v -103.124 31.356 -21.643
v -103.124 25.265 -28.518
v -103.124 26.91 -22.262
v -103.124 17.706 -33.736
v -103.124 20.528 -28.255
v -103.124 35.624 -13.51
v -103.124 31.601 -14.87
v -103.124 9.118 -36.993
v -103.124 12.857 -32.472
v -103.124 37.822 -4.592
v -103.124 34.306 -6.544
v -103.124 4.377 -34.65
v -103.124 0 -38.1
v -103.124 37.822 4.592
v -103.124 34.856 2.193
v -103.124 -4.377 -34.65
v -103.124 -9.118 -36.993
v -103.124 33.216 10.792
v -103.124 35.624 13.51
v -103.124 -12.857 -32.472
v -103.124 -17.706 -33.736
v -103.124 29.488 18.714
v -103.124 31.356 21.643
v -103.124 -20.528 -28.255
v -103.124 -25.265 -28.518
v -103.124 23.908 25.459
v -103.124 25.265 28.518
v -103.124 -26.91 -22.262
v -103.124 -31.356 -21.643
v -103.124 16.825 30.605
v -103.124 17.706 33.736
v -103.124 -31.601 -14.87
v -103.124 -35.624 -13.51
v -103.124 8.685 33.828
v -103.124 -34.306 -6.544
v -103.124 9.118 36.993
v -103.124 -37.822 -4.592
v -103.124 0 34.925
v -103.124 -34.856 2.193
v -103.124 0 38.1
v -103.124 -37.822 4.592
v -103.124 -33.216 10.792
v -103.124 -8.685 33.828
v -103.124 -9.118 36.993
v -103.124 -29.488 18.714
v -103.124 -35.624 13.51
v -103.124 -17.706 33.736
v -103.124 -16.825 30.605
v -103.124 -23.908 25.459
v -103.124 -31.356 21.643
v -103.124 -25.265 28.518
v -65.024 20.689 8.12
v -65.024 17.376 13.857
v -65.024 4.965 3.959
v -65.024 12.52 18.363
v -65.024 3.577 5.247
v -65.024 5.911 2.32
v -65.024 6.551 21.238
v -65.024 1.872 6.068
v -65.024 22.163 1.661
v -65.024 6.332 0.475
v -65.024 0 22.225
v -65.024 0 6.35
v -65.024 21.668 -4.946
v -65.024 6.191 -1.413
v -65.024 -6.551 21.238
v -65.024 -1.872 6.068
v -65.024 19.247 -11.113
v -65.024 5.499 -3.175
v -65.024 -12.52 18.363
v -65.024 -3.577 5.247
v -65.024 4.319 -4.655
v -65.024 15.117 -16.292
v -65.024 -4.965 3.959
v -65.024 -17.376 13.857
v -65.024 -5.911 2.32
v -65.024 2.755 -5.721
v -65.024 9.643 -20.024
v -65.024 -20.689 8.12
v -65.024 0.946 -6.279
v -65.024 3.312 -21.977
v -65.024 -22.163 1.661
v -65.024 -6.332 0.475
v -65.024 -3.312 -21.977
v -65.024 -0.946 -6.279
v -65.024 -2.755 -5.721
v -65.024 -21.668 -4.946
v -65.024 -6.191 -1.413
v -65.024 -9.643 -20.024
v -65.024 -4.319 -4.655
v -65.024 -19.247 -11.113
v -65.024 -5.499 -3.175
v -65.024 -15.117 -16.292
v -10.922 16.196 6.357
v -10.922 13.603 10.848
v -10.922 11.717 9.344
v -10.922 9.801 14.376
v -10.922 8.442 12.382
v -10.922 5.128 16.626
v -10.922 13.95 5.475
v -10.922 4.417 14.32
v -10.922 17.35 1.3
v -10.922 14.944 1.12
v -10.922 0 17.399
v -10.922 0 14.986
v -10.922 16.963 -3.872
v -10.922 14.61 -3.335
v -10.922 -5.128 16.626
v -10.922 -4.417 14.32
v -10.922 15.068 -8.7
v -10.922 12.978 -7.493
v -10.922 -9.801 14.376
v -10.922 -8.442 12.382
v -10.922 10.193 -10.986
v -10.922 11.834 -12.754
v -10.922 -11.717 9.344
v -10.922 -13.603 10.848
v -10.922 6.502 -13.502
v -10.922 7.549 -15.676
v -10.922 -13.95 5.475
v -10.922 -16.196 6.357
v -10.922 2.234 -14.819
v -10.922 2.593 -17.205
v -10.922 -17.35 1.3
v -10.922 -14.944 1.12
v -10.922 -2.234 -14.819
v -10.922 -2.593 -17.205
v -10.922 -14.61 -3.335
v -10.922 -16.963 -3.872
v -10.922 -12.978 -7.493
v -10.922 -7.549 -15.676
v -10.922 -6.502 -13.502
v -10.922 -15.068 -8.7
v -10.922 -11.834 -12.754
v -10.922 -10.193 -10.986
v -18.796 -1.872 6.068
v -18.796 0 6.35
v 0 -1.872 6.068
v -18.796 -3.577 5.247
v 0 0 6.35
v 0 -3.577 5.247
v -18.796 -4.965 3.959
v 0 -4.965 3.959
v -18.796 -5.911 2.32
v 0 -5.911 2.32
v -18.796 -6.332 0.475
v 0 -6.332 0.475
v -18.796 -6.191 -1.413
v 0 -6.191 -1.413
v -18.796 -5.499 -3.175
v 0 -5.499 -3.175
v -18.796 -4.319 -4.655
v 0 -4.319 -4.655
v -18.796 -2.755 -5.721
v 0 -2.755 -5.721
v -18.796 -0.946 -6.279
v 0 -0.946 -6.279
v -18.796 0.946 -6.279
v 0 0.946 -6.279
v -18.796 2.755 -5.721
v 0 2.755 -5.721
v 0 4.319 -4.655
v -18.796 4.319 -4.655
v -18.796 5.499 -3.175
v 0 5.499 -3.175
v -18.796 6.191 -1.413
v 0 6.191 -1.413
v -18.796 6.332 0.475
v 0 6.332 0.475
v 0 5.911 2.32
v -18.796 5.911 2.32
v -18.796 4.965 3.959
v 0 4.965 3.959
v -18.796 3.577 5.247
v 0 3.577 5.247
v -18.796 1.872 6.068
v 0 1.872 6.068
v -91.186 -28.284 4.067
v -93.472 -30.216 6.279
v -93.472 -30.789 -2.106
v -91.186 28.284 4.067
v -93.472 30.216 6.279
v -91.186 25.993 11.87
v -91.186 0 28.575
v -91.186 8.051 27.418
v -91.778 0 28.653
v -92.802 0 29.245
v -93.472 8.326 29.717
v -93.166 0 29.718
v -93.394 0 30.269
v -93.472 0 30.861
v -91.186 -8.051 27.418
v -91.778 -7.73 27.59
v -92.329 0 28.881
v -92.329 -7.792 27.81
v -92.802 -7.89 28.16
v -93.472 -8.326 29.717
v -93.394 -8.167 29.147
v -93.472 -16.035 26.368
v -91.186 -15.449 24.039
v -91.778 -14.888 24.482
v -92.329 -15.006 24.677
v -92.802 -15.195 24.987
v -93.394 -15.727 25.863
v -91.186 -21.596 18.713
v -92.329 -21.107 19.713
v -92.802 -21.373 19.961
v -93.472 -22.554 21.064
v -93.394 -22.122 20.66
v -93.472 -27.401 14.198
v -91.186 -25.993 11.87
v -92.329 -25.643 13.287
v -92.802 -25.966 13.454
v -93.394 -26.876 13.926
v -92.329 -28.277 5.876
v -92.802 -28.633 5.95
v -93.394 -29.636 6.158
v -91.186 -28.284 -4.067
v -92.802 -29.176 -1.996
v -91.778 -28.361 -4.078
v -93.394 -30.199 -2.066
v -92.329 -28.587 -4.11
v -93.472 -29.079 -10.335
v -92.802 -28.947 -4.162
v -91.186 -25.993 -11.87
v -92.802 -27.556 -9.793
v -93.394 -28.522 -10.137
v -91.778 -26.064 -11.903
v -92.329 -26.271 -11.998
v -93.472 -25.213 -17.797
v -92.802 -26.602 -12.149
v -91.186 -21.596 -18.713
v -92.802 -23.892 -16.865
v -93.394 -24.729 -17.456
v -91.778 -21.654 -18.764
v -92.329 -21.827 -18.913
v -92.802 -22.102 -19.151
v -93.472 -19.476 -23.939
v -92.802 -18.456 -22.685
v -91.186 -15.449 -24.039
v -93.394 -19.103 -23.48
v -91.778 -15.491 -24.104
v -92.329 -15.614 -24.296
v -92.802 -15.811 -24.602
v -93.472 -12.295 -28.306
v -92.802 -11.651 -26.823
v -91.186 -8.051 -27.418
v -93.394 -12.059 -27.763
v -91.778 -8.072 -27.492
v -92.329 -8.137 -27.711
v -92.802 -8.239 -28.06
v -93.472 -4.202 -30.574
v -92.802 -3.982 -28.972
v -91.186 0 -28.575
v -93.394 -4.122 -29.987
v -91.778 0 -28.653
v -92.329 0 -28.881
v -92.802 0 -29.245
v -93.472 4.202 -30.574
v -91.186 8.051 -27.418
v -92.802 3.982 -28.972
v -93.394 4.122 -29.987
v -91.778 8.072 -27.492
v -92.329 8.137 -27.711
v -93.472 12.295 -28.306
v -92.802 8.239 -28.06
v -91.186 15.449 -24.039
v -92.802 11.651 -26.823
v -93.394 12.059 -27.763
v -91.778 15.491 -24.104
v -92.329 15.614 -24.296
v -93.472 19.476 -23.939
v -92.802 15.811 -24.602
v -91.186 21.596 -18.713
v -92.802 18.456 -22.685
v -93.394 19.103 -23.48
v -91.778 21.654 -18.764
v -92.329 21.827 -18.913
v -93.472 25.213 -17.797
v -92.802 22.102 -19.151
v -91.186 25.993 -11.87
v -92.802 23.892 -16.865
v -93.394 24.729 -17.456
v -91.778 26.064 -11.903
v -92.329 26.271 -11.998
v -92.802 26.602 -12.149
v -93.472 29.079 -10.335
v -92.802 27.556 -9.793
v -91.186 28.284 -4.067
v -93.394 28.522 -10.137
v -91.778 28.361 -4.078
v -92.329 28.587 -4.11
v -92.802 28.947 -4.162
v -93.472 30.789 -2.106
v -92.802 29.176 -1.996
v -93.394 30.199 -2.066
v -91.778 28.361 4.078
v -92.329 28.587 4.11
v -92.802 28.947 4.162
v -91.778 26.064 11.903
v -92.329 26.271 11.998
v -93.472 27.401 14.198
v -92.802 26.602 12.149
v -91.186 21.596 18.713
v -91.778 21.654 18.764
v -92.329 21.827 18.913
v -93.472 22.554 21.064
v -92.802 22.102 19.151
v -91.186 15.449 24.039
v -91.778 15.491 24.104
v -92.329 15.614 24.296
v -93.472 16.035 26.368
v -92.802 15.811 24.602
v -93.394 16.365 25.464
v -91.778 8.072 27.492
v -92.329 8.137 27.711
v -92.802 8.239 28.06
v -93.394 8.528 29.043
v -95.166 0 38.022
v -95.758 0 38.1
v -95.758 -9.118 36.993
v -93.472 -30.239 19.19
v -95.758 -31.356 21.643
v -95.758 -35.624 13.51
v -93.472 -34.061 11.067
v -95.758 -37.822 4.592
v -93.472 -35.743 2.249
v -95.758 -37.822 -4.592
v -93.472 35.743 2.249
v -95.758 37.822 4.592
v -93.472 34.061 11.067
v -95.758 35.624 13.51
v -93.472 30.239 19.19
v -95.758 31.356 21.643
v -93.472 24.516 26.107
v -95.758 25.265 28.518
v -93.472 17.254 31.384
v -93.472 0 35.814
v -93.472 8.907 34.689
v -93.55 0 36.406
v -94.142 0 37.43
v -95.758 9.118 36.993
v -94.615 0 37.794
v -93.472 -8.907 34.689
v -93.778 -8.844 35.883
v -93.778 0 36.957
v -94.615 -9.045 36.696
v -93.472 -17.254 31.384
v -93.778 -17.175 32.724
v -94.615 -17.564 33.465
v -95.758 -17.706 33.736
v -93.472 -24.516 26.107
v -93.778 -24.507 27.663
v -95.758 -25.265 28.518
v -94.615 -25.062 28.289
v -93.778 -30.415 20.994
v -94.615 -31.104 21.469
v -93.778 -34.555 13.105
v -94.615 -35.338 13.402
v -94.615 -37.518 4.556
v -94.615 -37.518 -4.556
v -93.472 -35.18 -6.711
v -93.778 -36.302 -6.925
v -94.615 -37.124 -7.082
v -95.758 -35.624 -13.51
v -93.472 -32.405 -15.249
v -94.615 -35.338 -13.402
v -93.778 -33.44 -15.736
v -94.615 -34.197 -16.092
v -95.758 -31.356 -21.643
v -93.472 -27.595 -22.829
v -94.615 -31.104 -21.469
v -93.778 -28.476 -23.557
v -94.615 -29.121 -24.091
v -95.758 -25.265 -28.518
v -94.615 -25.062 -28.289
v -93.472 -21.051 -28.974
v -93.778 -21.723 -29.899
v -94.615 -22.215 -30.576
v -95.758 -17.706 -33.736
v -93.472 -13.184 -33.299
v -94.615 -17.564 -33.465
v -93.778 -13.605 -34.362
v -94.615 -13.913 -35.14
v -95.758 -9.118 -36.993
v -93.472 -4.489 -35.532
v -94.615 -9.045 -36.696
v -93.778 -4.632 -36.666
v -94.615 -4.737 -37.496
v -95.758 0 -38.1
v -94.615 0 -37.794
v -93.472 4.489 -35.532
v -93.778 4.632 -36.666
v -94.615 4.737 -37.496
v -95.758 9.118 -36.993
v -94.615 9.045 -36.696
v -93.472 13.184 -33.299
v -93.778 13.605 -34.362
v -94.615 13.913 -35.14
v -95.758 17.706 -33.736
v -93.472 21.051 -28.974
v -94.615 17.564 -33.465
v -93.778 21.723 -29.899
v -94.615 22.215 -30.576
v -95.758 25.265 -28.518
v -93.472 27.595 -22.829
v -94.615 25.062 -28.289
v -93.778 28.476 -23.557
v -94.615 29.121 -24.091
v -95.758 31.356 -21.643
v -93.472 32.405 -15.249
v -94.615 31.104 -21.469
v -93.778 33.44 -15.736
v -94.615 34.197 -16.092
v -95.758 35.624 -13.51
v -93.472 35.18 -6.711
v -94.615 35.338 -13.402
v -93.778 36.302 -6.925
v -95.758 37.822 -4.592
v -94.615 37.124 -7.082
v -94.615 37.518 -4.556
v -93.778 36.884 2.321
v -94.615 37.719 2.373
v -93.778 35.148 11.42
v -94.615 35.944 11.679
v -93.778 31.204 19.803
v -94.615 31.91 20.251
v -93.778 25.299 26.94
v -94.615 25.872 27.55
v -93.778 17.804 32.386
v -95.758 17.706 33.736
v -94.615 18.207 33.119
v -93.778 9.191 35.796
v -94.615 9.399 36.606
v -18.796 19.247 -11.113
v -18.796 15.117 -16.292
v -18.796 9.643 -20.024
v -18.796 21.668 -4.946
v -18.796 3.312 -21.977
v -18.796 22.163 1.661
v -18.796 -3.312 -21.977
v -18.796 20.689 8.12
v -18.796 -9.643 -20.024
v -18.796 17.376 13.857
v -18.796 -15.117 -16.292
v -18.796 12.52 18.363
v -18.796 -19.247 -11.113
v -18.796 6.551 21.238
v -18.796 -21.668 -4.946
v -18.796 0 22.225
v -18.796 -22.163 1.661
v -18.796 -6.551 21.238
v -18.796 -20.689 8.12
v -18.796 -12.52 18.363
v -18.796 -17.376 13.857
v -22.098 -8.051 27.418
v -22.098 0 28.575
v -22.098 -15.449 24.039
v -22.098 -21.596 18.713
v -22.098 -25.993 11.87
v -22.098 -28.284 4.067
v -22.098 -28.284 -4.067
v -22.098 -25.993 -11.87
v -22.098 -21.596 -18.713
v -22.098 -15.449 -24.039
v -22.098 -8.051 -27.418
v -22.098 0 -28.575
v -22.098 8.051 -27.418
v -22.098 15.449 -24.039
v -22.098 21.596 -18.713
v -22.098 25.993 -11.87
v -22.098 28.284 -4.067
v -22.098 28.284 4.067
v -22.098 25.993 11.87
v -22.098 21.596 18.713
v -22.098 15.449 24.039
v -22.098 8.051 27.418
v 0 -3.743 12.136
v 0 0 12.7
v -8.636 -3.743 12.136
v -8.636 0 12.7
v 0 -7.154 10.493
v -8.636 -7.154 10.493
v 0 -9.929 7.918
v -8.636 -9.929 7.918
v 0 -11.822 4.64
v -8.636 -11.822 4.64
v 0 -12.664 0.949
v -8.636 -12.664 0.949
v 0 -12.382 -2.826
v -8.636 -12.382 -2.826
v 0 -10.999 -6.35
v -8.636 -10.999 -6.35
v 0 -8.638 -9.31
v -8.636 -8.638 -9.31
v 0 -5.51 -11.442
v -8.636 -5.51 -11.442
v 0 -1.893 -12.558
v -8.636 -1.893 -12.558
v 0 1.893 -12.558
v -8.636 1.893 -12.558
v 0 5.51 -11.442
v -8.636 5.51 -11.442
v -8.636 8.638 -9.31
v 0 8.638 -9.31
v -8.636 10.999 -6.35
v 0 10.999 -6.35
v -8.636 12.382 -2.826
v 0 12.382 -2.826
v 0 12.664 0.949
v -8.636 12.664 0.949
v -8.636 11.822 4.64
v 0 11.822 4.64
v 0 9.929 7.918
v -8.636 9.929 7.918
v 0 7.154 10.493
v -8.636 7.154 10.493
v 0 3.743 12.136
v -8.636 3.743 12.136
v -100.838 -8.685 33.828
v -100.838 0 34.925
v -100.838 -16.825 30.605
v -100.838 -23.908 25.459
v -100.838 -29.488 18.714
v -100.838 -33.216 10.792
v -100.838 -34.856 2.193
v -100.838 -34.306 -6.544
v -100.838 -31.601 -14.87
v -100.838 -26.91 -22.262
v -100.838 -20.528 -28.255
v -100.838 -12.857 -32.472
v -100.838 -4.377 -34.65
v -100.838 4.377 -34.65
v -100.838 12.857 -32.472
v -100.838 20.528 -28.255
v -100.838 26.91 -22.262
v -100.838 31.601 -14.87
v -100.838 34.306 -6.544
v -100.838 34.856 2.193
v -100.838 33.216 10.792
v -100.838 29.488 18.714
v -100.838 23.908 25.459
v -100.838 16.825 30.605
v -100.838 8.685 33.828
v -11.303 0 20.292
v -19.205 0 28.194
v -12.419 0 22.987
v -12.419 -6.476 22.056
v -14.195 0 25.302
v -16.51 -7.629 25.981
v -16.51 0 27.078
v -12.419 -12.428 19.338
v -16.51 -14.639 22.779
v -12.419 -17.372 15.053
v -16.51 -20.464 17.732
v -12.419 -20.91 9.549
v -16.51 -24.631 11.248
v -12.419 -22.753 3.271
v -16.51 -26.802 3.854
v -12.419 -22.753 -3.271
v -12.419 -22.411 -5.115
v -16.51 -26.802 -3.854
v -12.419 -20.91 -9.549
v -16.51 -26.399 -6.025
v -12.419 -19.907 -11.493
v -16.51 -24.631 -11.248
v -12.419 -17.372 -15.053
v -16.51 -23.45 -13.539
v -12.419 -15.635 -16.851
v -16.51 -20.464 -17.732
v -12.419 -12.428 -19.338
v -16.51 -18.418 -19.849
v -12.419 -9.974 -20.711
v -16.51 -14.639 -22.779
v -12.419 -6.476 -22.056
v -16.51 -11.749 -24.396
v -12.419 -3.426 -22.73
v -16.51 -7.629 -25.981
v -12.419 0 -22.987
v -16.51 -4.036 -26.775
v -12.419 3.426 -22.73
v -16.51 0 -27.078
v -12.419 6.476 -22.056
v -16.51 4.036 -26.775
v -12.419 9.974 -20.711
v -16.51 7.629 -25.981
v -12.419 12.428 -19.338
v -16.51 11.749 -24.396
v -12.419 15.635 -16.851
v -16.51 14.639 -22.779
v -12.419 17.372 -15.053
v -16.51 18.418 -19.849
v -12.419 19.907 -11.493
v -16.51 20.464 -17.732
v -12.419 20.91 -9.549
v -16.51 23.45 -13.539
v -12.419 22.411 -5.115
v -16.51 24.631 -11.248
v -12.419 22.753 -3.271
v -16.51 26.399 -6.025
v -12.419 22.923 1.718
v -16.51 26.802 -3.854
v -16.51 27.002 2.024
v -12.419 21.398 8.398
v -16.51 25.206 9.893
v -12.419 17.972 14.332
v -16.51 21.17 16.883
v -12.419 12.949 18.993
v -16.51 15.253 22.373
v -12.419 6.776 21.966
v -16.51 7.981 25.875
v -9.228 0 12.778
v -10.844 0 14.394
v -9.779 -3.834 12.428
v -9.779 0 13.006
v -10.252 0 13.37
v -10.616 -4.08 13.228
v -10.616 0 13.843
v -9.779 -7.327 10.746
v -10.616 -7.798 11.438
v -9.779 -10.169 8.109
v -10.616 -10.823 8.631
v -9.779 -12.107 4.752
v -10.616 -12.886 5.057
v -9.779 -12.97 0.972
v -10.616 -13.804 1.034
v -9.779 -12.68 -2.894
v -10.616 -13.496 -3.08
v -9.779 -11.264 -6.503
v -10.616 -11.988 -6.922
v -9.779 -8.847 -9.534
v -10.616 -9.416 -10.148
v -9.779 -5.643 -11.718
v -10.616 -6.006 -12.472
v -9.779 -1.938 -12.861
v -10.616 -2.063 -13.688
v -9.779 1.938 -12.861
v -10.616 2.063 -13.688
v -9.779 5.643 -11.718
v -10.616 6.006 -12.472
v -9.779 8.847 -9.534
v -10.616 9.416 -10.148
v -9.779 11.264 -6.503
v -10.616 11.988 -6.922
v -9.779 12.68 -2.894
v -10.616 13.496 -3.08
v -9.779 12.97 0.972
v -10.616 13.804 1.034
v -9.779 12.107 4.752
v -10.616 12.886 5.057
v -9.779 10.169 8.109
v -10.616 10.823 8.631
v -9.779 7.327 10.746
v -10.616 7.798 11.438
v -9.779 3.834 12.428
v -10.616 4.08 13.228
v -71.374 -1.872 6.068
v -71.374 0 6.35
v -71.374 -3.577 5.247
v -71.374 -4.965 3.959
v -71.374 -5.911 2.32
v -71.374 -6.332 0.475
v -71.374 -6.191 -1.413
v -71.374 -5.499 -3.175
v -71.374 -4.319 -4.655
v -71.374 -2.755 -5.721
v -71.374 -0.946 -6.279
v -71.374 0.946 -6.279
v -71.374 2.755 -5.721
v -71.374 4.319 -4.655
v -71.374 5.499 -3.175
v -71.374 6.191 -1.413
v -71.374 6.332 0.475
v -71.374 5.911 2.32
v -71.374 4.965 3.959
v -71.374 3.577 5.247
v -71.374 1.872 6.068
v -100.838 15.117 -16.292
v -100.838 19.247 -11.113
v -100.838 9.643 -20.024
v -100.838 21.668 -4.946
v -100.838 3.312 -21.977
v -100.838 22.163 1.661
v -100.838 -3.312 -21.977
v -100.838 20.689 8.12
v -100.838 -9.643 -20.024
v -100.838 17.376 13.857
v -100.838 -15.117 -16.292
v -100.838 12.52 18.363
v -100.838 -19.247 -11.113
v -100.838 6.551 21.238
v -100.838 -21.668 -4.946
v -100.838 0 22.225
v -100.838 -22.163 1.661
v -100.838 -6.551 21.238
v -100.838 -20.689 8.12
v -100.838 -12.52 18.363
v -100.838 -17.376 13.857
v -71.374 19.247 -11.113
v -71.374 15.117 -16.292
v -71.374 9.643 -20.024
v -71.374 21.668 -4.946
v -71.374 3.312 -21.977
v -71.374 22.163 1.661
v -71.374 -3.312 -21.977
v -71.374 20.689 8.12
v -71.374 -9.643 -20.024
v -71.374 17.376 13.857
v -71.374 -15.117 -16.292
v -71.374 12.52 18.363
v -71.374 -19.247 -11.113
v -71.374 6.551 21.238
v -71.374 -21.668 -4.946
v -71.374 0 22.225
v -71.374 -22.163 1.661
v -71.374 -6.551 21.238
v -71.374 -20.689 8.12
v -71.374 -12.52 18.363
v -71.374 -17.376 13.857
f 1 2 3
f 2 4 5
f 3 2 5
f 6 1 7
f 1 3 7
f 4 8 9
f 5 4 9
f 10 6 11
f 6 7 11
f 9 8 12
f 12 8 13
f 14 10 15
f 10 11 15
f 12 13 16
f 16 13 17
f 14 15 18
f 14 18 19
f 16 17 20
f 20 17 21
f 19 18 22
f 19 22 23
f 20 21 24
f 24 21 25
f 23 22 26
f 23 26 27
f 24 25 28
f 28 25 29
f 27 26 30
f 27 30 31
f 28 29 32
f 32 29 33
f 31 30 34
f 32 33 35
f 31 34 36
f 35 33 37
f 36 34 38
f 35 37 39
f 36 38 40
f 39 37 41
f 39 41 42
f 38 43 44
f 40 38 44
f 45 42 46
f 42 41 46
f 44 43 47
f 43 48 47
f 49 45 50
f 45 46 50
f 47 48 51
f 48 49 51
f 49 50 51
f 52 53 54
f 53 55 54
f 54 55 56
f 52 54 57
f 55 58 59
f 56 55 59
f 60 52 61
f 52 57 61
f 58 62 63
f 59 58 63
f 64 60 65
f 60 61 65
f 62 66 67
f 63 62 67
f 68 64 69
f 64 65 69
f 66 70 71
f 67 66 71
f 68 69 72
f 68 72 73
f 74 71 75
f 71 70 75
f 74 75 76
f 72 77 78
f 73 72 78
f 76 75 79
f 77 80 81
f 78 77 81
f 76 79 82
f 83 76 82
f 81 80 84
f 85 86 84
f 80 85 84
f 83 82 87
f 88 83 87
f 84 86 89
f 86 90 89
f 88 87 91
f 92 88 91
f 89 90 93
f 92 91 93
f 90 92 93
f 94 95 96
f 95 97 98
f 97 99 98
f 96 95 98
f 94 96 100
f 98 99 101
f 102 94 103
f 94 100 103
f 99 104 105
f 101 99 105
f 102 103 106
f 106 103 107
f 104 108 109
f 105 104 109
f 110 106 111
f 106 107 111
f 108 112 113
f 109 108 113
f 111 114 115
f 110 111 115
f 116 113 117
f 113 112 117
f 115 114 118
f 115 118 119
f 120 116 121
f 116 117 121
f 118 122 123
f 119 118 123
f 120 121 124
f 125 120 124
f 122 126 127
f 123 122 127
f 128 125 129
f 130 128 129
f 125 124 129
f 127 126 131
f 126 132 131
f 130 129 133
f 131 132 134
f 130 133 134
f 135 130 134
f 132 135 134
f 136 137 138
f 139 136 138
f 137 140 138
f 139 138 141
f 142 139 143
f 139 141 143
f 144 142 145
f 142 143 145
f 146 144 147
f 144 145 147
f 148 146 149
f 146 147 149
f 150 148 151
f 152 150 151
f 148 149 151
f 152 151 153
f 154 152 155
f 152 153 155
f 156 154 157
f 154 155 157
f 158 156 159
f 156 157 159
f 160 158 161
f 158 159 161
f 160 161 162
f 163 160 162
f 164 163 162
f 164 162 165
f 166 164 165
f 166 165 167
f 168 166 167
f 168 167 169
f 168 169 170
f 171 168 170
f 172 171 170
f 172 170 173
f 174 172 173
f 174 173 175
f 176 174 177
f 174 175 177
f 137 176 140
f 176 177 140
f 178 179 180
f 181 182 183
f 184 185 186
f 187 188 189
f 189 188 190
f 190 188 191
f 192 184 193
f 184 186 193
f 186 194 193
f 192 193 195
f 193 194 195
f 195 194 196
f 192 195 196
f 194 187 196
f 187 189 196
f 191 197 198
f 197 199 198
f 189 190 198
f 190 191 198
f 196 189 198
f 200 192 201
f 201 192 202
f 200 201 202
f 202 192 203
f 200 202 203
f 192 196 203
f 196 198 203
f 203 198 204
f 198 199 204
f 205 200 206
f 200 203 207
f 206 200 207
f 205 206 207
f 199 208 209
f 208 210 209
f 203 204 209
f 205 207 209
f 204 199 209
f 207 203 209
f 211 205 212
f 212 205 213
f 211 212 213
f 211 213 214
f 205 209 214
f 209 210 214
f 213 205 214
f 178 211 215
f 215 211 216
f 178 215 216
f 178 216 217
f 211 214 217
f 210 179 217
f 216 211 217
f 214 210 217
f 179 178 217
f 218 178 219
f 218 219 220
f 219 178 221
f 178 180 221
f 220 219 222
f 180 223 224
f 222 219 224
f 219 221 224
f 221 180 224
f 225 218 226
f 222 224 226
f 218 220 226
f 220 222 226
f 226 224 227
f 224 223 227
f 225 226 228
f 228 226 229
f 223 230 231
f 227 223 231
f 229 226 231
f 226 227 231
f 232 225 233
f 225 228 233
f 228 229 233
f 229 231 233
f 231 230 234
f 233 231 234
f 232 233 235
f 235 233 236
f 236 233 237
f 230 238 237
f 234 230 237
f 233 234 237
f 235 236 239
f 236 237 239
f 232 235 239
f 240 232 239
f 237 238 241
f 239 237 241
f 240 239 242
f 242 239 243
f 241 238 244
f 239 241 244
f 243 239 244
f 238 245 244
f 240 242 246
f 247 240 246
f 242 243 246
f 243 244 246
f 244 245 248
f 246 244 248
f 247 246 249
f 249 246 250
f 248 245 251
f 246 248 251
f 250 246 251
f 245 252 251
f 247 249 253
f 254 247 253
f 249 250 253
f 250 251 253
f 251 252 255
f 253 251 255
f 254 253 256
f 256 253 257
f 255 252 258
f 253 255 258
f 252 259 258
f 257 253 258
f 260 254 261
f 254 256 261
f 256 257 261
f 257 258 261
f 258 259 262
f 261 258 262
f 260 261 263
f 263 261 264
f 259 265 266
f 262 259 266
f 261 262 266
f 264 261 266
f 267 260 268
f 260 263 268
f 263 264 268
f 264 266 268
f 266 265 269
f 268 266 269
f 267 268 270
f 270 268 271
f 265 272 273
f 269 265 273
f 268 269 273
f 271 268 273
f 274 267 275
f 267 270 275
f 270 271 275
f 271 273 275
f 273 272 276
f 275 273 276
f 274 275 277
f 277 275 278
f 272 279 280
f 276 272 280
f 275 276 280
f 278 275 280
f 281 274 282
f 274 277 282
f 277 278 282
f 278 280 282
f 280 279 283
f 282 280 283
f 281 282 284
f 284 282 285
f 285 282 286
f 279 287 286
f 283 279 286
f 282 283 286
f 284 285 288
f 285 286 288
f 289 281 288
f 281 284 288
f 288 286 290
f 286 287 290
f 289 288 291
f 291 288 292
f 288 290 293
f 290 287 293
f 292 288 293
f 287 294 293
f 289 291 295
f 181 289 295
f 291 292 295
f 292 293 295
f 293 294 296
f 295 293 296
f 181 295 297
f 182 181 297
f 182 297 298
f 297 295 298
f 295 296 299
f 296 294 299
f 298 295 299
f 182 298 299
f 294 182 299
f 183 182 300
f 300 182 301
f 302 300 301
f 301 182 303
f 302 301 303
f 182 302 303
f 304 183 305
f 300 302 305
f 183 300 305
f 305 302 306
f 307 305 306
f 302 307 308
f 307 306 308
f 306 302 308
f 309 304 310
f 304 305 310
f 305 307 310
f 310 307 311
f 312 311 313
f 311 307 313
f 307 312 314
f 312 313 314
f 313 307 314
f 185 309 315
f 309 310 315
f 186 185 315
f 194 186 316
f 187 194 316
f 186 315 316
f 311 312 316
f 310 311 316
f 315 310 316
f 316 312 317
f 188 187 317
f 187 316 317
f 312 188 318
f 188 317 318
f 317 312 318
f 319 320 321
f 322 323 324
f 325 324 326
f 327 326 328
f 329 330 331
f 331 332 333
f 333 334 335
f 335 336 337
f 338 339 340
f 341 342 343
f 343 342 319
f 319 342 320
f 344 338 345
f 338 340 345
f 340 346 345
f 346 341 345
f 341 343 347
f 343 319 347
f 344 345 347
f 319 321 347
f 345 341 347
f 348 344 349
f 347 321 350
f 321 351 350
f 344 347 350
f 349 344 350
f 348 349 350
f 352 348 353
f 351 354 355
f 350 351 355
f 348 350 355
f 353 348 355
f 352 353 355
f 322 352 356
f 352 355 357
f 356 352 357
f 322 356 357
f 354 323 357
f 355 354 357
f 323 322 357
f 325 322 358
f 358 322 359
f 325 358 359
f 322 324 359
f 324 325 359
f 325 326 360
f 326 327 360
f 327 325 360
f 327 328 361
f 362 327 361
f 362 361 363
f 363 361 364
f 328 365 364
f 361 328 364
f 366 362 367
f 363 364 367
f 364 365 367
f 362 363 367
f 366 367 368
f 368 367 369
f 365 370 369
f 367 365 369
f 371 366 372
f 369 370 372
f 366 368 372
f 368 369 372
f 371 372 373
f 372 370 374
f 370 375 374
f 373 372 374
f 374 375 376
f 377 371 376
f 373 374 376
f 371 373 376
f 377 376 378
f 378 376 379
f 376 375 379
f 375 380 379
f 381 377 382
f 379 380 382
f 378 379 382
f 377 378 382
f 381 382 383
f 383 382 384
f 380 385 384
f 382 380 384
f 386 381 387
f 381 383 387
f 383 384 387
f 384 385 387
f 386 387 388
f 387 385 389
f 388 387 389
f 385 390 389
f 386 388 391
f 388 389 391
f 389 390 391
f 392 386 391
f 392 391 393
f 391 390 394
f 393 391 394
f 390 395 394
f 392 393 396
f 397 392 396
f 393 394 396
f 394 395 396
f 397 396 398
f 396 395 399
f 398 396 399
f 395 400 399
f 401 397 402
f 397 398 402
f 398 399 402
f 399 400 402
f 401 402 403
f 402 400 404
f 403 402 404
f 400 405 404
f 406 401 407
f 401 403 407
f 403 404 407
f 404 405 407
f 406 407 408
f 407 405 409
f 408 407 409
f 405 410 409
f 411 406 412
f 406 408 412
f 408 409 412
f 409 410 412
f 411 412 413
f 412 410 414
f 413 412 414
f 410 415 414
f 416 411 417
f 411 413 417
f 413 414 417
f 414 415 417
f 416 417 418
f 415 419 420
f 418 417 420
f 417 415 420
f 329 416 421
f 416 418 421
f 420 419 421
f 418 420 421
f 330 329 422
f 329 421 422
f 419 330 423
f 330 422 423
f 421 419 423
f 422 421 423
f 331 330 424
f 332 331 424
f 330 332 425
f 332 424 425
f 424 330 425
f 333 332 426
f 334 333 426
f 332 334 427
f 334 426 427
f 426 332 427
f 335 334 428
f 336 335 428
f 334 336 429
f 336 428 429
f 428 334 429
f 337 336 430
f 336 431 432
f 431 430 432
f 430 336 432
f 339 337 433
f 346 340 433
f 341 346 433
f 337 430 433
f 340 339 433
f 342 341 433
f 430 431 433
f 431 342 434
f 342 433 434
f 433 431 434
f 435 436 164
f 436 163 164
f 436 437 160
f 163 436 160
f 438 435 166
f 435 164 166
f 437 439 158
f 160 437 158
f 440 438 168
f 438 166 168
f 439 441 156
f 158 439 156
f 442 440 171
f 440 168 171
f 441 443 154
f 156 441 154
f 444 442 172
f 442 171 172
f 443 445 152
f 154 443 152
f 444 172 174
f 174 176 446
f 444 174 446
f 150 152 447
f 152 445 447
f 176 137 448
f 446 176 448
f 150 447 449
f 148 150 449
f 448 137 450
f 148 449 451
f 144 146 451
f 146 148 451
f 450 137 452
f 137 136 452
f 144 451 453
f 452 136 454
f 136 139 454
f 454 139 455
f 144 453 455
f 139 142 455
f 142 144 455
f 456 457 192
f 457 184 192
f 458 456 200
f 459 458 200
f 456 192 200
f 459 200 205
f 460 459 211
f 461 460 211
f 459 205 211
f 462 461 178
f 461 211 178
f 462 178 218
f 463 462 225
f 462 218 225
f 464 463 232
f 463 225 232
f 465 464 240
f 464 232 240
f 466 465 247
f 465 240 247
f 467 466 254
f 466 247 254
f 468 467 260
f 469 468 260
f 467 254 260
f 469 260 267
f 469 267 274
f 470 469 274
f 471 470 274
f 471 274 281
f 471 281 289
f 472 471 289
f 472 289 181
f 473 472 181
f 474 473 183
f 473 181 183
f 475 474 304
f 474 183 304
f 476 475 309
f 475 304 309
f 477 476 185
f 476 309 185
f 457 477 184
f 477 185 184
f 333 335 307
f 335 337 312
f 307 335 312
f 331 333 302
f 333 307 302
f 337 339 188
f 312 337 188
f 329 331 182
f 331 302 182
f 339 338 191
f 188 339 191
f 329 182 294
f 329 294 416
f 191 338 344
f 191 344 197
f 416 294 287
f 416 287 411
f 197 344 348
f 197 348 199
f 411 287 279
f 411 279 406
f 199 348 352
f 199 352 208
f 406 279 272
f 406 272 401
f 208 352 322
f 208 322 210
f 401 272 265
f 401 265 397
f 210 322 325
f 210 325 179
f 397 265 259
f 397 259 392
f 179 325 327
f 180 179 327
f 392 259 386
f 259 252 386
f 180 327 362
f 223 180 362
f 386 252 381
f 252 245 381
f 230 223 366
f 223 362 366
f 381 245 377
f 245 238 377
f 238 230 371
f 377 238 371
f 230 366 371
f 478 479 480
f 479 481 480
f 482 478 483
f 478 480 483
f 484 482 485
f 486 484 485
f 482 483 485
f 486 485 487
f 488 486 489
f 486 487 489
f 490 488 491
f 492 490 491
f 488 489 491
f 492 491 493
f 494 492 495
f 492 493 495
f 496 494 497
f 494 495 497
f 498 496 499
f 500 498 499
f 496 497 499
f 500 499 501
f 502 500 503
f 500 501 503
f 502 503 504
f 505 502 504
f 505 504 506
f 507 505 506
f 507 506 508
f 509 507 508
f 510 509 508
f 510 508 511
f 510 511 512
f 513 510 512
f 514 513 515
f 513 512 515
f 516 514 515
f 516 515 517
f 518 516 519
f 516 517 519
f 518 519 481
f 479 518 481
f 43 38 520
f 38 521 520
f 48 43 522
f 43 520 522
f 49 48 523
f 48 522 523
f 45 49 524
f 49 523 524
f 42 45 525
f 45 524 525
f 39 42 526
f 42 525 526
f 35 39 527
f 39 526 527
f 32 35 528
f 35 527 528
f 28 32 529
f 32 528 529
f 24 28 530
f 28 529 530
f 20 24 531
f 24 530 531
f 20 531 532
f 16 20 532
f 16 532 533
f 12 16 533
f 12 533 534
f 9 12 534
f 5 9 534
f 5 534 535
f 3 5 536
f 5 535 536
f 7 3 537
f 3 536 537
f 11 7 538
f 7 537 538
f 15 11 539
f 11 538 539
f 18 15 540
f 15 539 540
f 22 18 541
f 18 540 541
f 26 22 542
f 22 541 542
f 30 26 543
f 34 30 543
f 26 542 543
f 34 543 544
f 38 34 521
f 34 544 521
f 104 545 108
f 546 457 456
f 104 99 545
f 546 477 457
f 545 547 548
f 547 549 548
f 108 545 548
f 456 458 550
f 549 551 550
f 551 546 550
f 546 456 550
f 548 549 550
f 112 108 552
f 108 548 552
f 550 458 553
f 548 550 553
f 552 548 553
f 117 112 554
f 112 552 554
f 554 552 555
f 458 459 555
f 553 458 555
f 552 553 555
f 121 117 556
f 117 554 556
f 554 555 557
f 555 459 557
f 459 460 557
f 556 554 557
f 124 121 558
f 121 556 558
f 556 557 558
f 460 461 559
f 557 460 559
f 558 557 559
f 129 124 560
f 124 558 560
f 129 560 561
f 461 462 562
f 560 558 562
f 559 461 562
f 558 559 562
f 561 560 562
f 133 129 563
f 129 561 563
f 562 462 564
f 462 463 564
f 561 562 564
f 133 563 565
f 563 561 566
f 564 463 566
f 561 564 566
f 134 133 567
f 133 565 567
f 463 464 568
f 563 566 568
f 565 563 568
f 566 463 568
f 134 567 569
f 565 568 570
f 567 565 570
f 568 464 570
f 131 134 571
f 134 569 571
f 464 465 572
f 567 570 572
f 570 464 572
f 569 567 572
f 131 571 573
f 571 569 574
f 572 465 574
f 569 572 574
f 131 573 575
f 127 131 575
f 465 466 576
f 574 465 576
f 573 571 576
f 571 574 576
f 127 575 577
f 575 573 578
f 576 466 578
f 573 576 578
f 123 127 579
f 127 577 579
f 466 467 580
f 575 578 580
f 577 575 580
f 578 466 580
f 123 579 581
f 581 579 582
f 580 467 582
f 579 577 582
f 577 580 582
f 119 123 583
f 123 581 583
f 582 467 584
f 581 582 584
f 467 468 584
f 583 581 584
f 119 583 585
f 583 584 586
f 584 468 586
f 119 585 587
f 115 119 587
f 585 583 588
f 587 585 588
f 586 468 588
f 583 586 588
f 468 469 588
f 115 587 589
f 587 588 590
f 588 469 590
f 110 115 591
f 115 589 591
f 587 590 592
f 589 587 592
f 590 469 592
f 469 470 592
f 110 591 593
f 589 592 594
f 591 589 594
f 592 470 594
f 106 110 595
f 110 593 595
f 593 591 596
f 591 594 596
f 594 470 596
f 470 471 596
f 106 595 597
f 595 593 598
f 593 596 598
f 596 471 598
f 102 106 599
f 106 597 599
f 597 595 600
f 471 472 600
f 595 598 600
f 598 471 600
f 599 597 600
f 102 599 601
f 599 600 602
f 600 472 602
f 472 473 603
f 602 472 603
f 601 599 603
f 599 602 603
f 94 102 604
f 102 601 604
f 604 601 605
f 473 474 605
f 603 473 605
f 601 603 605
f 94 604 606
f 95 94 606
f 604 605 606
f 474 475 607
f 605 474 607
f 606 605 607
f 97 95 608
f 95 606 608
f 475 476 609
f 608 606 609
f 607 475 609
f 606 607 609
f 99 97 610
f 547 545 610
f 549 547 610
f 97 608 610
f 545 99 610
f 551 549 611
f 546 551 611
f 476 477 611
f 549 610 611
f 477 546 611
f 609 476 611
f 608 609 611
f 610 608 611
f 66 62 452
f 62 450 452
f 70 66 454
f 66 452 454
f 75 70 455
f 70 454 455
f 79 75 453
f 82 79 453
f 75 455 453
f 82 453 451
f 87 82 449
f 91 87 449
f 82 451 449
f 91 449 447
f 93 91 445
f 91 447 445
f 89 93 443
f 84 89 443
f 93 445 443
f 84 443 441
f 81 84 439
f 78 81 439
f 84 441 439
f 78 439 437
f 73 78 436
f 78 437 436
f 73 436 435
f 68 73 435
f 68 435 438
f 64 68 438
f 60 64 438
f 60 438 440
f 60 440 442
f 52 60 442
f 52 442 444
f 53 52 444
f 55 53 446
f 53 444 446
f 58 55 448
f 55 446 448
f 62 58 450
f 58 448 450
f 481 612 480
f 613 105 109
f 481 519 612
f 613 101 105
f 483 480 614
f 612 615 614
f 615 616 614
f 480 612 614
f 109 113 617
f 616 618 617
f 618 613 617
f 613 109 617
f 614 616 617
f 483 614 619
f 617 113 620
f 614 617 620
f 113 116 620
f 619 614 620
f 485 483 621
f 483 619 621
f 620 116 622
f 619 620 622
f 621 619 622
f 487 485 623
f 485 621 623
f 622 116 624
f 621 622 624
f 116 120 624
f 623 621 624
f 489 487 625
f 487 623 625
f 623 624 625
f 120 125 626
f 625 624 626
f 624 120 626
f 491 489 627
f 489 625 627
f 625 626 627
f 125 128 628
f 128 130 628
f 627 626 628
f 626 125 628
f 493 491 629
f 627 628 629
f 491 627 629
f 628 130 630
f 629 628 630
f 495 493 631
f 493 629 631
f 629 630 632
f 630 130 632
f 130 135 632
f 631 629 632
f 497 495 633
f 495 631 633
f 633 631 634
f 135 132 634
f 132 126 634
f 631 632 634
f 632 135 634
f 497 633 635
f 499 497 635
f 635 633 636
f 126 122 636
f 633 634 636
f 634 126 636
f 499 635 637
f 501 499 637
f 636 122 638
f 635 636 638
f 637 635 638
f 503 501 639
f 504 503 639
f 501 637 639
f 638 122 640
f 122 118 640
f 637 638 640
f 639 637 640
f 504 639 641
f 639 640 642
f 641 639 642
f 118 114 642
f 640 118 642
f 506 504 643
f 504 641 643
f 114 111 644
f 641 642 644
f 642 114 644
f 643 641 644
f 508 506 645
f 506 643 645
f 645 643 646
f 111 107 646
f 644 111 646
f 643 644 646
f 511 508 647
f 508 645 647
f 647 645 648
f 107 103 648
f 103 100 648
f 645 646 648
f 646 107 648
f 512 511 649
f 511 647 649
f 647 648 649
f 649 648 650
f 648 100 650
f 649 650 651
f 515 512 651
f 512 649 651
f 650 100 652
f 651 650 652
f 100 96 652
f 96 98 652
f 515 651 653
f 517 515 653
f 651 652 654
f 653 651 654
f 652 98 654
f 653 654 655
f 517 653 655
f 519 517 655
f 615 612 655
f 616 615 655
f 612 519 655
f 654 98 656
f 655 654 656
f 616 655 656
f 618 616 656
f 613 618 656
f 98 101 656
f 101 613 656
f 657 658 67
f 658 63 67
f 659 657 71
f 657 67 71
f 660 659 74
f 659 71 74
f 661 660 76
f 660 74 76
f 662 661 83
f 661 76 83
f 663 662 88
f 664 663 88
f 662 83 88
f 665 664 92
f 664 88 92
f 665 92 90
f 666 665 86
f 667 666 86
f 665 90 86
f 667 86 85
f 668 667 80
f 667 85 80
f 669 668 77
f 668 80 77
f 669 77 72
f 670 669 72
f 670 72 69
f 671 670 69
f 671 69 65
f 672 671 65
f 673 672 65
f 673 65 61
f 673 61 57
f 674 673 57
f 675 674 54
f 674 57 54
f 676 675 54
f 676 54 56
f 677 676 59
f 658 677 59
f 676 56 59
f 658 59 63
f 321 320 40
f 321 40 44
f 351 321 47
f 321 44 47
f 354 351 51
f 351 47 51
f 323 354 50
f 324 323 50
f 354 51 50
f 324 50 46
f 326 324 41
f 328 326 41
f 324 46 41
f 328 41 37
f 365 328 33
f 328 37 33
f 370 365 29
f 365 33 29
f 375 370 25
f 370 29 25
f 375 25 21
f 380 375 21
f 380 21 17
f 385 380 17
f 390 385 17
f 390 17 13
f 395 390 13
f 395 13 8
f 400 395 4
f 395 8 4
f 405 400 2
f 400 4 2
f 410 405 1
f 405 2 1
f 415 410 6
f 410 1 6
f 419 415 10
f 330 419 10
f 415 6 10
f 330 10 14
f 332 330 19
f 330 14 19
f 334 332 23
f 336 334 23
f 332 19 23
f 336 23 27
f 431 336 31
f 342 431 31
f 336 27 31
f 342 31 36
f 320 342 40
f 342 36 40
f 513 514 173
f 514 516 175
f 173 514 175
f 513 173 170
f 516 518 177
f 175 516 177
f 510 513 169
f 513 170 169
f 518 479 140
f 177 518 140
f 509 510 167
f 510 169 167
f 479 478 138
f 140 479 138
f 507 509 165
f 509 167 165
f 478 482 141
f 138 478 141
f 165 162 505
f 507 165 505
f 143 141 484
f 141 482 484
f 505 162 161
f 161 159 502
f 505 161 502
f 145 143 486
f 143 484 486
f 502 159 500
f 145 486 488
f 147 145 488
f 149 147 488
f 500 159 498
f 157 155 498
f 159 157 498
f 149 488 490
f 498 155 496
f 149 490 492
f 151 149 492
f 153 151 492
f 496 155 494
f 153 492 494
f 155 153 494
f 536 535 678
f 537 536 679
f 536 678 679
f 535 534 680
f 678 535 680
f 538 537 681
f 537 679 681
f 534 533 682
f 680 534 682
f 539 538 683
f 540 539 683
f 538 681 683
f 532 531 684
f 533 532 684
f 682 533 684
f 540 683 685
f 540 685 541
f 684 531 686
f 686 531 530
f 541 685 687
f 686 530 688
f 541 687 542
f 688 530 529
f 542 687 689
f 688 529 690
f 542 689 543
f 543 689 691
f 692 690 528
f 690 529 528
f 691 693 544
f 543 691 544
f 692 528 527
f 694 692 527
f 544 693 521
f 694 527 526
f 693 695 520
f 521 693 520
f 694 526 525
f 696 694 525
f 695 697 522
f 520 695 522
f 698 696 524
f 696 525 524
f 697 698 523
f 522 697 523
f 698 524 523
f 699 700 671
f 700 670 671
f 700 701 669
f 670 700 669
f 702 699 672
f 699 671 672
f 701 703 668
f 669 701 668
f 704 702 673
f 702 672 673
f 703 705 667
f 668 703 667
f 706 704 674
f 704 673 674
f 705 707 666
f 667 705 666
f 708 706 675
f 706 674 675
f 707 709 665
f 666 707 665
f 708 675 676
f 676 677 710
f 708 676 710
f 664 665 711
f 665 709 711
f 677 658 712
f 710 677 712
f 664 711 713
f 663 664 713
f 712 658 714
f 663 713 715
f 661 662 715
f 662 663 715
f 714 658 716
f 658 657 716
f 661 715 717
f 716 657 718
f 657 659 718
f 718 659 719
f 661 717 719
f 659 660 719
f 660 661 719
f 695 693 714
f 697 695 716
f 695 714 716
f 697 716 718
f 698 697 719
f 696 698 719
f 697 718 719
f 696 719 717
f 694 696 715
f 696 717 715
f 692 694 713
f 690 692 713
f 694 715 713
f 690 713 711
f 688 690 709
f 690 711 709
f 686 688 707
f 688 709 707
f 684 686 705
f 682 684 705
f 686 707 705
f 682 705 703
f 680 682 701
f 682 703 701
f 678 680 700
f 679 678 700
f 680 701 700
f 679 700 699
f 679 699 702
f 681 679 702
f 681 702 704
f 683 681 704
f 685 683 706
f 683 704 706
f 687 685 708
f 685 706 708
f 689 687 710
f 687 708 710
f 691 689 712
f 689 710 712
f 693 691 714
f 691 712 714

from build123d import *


with BuildPart() as f1:
    # F0 (on Front) → F1 (revolve)
    with BuildSketch(Plane.XZ):
        with BuildLine():
            Line((-18.796, 6.35), (0, 6.35))
            Line((0, 6.35), (0, 12.7))
            Line((0, 12.7), (-8.636, 12.7))
            ThreePointArc((-8.636, 12.7), (-10.252446, 13.369554), (-10.922, 14.986))
            Line((-10.922, 14.986), (-10.922, 17.399))
            ThreePointArc((-10.922, 17.399), (-14.195375, 25.301625), (-22.098, 28.575))
            Line((-22.098, 28.575), (-91.186, 28.575))
            ThreePointArc((-91.186, 28.575), (-92.802446, 29.244554), (-93.472, 30.861))
            Line((-93.472, 30.861), (-93.472, 35.814))
            ThreePointArc((-93.472, 35.814), (-94.141554, 37.430446), (-95.758, 38.1))
            Line((-95.758, 38.1), (-103.124, 38.1))
            Line((-103.124, 38.1), (-103.124, 34.925))
            Line((-103.124, 34.925), (-100.838, 34.925))
            Line((-100.838, 34.925), (-100.838, 22.225))
            Line((-100.838, 22.225), (-71.374, 22.225))
            Line((-71.374, 22.225), (-71.374, 6.35))
            Line((-71.374, 6.35), (-65.024, 6.35))
            Line((-65.024, 6.35), (-65.024, 22.225))
            Line((-65.024, 22.225), (-18.796, 22.225))
            Line((-18.796, 22.225), (-18.796, 6.35))
        make_face()
    revolve(axis=Axis((-51.562, 0, 0), (1, 0, 0)))


solid = f1.part
